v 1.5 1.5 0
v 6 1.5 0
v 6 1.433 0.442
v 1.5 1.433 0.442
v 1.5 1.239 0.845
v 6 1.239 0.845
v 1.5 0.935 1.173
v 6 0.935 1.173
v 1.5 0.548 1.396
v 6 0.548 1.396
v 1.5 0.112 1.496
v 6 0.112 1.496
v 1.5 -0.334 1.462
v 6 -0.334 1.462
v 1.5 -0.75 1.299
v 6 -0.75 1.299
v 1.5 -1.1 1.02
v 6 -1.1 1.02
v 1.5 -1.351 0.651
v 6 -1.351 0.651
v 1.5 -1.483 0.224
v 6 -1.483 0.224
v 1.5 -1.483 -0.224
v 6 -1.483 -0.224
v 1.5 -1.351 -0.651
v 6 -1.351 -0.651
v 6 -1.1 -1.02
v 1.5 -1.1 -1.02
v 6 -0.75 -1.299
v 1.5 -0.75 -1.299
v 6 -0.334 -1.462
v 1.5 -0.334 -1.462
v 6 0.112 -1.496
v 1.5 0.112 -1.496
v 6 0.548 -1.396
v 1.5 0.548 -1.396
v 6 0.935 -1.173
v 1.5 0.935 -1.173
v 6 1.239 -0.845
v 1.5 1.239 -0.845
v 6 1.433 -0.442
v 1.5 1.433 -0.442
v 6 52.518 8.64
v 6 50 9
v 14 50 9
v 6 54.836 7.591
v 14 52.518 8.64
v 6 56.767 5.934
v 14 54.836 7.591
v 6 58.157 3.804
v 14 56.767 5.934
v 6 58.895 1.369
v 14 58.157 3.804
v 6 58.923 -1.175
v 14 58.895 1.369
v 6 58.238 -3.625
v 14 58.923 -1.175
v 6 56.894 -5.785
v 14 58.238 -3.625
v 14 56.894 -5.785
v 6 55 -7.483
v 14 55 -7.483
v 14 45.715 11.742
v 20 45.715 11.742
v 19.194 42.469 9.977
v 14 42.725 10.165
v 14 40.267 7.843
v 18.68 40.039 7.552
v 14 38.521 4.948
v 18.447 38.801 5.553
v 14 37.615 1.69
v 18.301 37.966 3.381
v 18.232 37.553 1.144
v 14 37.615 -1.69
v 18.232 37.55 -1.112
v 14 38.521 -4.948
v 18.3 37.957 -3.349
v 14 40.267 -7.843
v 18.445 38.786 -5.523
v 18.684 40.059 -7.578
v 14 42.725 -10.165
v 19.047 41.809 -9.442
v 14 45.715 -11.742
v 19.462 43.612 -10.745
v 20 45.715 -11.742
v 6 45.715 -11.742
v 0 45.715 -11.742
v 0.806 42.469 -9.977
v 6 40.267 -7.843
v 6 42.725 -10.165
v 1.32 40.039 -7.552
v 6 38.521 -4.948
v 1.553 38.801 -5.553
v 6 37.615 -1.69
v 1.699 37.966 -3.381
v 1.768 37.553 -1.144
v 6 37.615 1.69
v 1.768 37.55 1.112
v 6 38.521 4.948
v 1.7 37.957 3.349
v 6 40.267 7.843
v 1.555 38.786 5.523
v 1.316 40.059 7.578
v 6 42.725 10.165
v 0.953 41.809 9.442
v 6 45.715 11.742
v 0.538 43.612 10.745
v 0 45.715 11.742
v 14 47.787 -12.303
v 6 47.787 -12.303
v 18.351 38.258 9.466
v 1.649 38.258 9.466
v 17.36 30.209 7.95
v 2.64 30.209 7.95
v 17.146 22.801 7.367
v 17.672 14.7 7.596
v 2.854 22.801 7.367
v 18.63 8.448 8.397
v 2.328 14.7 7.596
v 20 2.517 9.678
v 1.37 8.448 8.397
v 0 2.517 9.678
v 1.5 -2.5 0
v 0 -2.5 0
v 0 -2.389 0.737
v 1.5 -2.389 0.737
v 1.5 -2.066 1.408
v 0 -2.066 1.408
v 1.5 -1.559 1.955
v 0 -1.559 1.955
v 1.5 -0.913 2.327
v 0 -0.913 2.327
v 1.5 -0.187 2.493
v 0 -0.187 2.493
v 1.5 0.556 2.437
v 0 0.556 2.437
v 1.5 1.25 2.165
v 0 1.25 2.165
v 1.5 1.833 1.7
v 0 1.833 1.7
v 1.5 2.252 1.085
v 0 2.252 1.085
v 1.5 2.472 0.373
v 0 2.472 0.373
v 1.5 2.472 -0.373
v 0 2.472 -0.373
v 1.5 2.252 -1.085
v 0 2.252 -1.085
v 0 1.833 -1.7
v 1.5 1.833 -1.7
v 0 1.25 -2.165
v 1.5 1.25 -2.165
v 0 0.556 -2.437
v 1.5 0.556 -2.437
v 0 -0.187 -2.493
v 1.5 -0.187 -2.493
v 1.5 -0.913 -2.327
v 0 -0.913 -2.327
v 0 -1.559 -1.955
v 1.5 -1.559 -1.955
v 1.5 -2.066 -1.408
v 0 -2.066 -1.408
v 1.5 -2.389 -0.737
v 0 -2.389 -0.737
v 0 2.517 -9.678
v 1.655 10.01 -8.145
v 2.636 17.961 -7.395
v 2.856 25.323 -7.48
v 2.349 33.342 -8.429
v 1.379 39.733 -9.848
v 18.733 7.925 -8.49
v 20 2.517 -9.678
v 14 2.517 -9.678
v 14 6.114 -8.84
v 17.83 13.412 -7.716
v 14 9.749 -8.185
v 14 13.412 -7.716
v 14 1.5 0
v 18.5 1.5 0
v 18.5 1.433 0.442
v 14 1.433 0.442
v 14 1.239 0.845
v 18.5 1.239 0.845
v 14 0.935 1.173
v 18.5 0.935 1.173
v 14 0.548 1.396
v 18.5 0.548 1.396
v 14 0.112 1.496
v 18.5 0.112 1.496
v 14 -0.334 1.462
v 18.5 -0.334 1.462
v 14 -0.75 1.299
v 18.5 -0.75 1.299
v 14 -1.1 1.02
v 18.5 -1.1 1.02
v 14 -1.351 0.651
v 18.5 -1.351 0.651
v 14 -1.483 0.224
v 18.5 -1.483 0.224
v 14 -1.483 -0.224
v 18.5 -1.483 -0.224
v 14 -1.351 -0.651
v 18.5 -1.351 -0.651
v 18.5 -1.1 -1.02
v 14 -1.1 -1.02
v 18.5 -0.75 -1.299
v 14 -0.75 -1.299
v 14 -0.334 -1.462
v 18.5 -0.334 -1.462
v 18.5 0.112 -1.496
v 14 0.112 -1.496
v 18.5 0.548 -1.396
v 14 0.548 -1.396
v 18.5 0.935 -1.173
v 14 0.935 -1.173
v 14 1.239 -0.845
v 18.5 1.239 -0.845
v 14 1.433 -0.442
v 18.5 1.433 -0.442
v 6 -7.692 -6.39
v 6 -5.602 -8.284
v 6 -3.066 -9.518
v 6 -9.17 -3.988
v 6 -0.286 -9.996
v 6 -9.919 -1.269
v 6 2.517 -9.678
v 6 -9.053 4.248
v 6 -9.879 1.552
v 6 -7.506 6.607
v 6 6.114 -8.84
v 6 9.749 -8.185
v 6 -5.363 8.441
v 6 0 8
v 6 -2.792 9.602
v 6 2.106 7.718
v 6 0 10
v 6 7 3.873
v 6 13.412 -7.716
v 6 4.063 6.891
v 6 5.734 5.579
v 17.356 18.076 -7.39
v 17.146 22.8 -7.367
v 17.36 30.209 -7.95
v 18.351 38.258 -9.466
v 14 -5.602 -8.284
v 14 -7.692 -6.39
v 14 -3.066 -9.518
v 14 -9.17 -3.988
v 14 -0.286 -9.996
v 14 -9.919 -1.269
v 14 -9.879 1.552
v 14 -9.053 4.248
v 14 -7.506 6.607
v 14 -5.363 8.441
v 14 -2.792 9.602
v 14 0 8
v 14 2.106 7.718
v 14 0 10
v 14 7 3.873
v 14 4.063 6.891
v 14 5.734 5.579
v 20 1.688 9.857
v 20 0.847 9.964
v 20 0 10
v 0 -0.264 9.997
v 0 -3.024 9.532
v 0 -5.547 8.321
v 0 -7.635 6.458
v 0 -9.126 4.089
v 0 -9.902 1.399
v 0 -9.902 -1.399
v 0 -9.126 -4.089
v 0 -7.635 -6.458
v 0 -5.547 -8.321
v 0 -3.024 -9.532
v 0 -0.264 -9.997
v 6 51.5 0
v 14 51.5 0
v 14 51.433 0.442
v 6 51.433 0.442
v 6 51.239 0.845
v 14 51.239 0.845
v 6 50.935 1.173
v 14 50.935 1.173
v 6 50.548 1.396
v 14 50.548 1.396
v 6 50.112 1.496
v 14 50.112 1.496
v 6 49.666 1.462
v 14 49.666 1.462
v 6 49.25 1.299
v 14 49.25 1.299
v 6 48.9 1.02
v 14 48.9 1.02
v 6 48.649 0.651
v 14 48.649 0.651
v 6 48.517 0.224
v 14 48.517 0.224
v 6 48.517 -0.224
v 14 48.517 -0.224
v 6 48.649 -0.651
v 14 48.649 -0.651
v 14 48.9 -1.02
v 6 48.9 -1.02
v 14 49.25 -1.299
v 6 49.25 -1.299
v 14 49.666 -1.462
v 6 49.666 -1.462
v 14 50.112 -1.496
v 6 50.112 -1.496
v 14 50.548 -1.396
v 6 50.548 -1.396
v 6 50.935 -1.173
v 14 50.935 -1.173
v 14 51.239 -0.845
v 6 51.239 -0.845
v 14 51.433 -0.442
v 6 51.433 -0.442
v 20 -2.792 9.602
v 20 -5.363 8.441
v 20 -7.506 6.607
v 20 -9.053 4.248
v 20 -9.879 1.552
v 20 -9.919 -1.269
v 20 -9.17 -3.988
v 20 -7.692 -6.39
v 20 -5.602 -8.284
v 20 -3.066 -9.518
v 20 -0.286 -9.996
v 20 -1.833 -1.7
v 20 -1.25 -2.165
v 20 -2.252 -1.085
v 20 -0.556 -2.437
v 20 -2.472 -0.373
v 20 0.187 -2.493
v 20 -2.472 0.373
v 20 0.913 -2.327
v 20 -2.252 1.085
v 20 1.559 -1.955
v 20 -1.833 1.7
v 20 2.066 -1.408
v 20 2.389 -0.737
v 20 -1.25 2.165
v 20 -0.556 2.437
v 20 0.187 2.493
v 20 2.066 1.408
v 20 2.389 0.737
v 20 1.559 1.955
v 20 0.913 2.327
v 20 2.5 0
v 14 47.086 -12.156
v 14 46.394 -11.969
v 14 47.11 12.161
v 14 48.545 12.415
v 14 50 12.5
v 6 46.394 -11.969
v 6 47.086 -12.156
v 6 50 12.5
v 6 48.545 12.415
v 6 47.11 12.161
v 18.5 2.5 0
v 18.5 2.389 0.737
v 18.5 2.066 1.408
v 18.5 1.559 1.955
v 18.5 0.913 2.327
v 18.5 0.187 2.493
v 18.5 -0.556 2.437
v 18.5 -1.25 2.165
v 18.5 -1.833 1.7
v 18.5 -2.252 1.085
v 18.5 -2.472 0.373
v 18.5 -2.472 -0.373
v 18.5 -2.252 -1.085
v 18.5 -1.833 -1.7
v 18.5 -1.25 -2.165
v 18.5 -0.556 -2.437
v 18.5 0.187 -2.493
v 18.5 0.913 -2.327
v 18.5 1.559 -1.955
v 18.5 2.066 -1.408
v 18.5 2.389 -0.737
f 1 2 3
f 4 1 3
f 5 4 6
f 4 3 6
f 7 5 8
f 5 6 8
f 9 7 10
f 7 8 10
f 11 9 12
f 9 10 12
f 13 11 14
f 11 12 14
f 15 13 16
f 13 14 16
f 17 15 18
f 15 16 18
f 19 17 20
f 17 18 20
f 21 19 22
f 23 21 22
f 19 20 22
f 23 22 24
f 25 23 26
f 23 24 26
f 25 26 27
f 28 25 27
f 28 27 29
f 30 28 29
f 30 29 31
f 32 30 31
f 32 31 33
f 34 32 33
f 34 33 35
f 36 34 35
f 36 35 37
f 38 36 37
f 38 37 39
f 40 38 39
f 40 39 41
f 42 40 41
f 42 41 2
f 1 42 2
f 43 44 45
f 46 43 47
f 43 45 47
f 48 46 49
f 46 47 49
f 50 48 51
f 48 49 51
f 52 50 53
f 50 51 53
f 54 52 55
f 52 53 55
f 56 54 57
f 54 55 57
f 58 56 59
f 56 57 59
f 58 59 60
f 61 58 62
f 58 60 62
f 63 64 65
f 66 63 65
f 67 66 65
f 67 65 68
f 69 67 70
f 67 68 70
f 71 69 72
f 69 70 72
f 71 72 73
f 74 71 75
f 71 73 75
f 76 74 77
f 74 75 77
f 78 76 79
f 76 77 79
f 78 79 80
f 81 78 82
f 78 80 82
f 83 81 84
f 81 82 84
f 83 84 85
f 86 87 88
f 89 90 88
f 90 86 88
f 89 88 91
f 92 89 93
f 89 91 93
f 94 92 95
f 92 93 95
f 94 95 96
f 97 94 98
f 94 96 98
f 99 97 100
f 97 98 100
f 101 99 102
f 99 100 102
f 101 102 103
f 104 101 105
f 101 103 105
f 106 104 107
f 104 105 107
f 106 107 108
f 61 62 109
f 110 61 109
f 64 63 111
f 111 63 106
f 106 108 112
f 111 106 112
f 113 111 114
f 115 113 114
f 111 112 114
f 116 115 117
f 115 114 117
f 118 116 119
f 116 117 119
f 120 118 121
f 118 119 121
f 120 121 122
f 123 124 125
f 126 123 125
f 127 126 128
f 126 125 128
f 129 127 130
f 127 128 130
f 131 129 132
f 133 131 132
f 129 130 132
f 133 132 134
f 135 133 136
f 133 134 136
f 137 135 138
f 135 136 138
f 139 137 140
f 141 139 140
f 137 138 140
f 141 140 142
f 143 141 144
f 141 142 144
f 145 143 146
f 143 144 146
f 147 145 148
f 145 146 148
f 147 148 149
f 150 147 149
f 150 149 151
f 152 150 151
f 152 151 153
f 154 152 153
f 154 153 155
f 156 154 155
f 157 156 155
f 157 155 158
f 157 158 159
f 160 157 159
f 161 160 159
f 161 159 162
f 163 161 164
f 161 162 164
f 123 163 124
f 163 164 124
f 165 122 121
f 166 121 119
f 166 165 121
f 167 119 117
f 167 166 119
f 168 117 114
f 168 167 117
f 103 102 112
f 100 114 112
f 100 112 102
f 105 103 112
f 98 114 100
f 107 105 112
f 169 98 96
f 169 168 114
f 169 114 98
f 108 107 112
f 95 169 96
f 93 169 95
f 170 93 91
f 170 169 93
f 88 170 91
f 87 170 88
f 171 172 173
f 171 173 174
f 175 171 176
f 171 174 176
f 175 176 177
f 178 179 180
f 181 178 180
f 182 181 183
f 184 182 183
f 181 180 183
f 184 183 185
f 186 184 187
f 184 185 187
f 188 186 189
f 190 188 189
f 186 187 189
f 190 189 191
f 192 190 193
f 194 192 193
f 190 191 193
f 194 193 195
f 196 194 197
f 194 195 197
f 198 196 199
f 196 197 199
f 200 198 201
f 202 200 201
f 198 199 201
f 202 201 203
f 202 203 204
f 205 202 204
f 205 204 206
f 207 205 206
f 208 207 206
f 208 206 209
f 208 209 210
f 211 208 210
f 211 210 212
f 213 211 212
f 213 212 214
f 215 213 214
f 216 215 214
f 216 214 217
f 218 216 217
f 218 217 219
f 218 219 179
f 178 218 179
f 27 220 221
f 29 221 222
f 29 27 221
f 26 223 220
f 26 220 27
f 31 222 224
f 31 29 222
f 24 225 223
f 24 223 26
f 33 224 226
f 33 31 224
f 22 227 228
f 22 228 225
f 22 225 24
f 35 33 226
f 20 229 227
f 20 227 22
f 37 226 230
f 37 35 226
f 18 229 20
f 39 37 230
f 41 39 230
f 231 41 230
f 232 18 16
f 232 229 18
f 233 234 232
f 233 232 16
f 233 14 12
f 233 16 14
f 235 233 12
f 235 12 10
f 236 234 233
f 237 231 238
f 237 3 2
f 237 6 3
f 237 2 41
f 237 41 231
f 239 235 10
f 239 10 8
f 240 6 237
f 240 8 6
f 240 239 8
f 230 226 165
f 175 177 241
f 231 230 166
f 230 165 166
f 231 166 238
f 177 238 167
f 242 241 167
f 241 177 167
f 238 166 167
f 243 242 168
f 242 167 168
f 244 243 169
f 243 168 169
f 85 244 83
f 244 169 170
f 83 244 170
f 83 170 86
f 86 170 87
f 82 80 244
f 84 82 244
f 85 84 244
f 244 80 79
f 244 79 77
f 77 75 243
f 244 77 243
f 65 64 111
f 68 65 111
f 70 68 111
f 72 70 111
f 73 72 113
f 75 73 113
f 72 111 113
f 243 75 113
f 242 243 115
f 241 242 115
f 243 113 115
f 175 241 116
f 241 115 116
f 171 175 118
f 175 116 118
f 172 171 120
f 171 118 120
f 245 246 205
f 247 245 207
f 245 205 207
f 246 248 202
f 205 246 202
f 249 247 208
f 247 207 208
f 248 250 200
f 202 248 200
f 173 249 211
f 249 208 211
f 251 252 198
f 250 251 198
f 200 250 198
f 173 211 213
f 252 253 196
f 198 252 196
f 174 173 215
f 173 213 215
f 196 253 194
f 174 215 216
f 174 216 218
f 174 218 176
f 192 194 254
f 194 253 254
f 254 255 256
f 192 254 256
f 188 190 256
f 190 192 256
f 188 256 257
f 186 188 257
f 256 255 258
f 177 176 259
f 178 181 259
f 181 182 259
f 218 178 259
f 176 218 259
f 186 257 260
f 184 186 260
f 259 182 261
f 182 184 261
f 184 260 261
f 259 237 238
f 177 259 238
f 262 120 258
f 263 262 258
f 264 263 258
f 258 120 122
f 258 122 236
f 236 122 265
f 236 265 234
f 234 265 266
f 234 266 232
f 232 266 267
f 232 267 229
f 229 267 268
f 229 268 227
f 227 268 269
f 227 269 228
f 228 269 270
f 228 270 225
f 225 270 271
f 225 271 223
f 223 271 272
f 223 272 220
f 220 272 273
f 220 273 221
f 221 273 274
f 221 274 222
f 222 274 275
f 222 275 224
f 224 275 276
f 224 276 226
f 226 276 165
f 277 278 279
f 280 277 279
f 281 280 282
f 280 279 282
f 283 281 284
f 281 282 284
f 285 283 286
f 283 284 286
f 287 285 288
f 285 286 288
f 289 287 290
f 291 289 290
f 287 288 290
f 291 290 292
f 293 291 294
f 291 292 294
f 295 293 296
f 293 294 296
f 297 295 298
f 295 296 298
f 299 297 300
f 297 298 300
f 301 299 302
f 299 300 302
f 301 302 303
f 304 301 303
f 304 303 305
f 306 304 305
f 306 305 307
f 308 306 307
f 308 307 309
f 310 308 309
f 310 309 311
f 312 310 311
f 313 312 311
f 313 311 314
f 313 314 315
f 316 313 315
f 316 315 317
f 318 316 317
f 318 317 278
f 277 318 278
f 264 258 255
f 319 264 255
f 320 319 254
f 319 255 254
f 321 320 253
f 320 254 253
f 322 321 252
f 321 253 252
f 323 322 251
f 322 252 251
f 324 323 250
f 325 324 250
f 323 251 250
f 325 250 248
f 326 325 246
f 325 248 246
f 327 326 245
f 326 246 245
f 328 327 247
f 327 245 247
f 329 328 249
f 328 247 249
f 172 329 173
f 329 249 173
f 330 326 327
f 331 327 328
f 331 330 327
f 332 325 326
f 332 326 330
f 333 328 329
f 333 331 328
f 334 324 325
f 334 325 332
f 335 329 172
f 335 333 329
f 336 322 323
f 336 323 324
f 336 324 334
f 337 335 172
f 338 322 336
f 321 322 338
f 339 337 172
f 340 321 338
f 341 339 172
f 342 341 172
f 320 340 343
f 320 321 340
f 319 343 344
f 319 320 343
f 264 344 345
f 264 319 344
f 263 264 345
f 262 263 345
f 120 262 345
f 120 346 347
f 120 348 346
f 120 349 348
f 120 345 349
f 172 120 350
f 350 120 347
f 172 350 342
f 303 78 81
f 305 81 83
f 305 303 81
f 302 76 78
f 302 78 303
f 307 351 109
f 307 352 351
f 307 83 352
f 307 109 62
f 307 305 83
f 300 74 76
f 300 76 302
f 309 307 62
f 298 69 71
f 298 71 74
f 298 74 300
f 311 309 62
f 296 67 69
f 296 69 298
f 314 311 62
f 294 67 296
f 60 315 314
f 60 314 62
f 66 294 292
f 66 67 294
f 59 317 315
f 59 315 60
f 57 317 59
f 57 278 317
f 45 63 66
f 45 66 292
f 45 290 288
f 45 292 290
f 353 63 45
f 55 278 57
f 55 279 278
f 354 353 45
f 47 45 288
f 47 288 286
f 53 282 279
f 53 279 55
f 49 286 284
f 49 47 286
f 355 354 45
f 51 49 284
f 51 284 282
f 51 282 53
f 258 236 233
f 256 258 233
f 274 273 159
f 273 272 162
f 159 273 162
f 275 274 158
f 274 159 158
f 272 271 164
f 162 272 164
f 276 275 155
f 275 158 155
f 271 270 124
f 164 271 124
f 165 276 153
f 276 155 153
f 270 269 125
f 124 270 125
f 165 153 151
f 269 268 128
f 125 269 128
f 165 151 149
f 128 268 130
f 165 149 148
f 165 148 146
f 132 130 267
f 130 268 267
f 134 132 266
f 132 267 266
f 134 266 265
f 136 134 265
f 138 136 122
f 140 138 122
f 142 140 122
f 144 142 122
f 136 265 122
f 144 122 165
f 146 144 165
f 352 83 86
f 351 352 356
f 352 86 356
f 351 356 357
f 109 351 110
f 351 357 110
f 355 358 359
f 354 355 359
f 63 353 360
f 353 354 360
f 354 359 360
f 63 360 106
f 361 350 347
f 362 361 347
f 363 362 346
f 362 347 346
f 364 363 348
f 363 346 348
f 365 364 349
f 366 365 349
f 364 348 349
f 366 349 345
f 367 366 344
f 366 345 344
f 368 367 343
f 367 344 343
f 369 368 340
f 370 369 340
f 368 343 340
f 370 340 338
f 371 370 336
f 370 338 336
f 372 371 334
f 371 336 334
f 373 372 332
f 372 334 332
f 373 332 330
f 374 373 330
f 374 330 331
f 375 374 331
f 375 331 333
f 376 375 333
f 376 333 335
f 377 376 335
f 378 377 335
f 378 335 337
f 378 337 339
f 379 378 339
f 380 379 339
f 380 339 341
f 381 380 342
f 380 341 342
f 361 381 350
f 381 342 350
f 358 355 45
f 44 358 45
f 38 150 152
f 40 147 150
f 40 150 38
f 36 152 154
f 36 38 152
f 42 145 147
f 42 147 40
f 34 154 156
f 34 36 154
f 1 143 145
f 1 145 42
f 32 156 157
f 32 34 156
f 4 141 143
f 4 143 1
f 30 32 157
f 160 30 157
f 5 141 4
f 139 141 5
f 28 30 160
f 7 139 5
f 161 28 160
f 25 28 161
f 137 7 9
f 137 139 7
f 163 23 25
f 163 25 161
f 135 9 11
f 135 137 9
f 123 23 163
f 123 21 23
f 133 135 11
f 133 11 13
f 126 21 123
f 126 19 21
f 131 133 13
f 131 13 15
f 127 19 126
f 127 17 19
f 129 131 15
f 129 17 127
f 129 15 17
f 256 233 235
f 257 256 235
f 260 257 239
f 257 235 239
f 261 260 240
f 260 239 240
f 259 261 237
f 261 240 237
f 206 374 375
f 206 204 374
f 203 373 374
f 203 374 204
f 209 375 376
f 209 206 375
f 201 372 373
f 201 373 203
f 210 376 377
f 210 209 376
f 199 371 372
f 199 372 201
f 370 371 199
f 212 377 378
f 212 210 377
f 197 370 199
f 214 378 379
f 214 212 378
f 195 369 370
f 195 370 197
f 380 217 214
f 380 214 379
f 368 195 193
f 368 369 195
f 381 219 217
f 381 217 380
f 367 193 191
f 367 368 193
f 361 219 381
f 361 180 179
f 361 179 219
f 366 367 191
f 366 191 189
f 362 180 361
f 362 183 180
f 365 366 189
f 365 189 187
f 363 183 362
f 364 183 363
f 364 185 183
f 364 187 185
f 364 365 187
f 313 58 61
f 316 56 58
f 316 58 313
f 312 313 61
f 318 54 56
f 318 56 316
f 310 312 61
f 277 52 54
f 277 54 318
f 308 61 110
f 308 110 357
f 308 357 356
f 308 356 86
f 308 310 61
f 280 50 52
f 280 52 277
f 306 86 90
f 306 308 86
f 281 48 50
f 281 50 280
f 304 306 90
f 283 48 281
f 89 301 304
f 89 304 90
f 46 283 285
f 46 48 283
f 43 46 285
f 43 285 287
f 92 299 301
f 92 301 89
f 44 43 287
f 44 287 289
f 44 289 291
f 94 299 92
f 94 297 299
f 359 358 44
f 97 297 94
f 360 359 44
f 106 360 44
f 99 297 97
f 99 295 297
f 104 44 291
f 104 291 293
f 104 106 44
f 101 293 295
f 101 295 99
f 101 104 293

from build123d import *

# Parameters (mm, degrees)
F1_DEPTH  = 6
F3_DEPTH  = 8
F5_DEPTH  = 6
F6_R      = 12.5
F7_DEPTH  = 6
F8_R      = 12.5
F9_DEPTH  = 6
F11_DEPTH = 14.001
F12_R     = 1.5
F13_DEPTH = 20.001
F14_R     = 2.5
F15_DEPTH = 1.5
F16_R     = 2.5
F17_DEPTH = 1.5
F18_R     = 82.8644231172
F19_DEPTH = 12.5


with BuildPart() as f1:
    # F0 (on Right) → F1 (new body)
    with BuildSketch(Plane.YZ):
        with BuildLine():
            ThreePointArc((45.7146496628, 11.7424772722), (24.2728942701, 7.4219237759), (2.5168433046, 9.6780938092))
            ThreePointArc((2.5168433046, 9.6780938092), (-10, 0), (2.5168433046, -9.6780938092))
            ThreePointArc((2.5168433046, -9.6780938092), (24.2728942701, -7.4219237759), (45.7146496628, -11.7424772722))
            ThreePointArc((45.7146496628, -11.7424772722), (62.5, 0), (45.7146496628, 11.7424772722))
        make_face()
    extrude(amount=F1_DEPTH)

    # F2 (on face) → F3 (join)
    with BuildSketch(Plane.YZ.offset(6)):
        with BuildLine():
            ThreePointArc((45.7146496628, 11.7424772722), (24.2728942701, 7.4219237759), (2.5168433046, 9.6780938092))
            ThreePointArc((2.5168433046, 9.6780938092), (1.2686729105, 9.919196996), (0, 10))
            Line((0, 10), (0, 8))
            ThreePointArc((0, 8), (4.0630120127, 6.8914391374), (7, 3.8729833462))
            Line((7, 3.8729833462), (13.4120563723, -7.716117508))
            ThreePointArc((13.4120563723, -7.716117508), (29.7917342094, -7.8970456319), (45.7146496628, -11.7424772722))
            ThreePointArc((45.7146496628, -11.7424772722), (62.5, 0), (45.7146496628, 11.7424772722))
        make_face()
    extrude(amount=F3_DEPTH)

    # F4 (on face) → F5 (join)
    with BuildSketch(Plane.YZ.offset(14)):
        with BuildLine():
            ThreePointArc((2.5168433046, 9.6780938092), (1.2686729105, 9.919196996), (0, 10))
            ThreePointArc((0, 10), (-9.919196996, -1.2686729105), (2.5168433046, -9.6780938092))
            ThreePointArc((2.5168433046, -9.6780938092), (7.9270301673, -8.4893073841), (13.4120563723, -7.716117508))
            ThreePointArc((13.4120563723, -7.716117508), (29.7917342094, -7.8970456319), (45.7146496628, -11.7424772722))
            ThreePointArc((45.7146496628, -11.7424772722), (62.5, 0), (45.7146496628, 11.7424772722))
            ThreePointArc((45.7146496628, 11.7424772722), (24.2728942701, 7.4219237759), (2.5168433046, 9.6780938092))
        make_face()
    extrude(amount=F5_DEPTH)

    # F6 (on face) → F7 (cut)
    with BuildSketch(Plane.YZ.offset(20)):
        with Locations((50, 0)):
            Circle(F6_R)
    extrude(amount=-F7_DEPTH, mode=Mode.SUBTRACT)

    # F8 (on face) → F9 (cut)
    with BuildSketch(Plane(origin=(0, 0, 0), x_dir=(0, -1, 0), z_dir=(-1, 0, 0))):
        with Locations((-50, 0)):
            Circle(F8_R)
    extrude(amount=-F9_DEPTH, mode=Mode.SUBTRACT)

    # F10 (on face) → F11 (cut, through all)
    with BuildSketch(Plane.YZ.offset(14)):
        with BuildLine():
            Line((55, -7.4833147735), (47.7871856146, -12.3025790994))
            ThreePointArc((47.7871856146, -12.3025790994), (62.4505469507, -1.1108017956), (50, 12.5))
            Line((50, 12.5), (50, 9))
            ThreePointArc((50, 9), (58.6124860802, 2.6124860802), (55, -7.4833147735))
        make_face()
    extrude(amount=-F11_DEPTH, mode=Mode.SUBTRACT)

    # F12 (on face) → F13 (cut, through all)
    with BuildSketch(Plane.YZ.offset(20)):
        Circle(F12_R)
        with Locations((50, 0)):
            Circle(F12_R)
    extrude(amount=-F13_DEPTH, mode=Mode.SUBTRACT)

    # F14 (on face) → F15 (cut)
    with BuildSketch(Plane.YZ.offset(20)):
        Circle(F14_R)
    extrude(amount=-F15_DEPTH, mode=Mode.SUBTRACT)

    # F16 (on face) → F17 (cut)
    with BuildSketch(Plane(origin=(0, 0, 0), x_dir=(0, -1, 0), z_dir=(-1, 0, 0))):
        Circle(F16_R)
    extrude(amount=-F17_DEPTH, mode=Mode.SUBTRACT)

    # F18 (on Top) → F19 (cut, symmetric)
    with BuildSketch(Plane.XY):
        with Locations((-80, 24.1157464837)):
            Circle(F18_R)
        with Locations((100, 24.1157464837)):
            Circle(F18_R)
    extrude(amount=F19_DEPTH, both=True, mode=Mode.SUBTRACT)


solid = f1.part
